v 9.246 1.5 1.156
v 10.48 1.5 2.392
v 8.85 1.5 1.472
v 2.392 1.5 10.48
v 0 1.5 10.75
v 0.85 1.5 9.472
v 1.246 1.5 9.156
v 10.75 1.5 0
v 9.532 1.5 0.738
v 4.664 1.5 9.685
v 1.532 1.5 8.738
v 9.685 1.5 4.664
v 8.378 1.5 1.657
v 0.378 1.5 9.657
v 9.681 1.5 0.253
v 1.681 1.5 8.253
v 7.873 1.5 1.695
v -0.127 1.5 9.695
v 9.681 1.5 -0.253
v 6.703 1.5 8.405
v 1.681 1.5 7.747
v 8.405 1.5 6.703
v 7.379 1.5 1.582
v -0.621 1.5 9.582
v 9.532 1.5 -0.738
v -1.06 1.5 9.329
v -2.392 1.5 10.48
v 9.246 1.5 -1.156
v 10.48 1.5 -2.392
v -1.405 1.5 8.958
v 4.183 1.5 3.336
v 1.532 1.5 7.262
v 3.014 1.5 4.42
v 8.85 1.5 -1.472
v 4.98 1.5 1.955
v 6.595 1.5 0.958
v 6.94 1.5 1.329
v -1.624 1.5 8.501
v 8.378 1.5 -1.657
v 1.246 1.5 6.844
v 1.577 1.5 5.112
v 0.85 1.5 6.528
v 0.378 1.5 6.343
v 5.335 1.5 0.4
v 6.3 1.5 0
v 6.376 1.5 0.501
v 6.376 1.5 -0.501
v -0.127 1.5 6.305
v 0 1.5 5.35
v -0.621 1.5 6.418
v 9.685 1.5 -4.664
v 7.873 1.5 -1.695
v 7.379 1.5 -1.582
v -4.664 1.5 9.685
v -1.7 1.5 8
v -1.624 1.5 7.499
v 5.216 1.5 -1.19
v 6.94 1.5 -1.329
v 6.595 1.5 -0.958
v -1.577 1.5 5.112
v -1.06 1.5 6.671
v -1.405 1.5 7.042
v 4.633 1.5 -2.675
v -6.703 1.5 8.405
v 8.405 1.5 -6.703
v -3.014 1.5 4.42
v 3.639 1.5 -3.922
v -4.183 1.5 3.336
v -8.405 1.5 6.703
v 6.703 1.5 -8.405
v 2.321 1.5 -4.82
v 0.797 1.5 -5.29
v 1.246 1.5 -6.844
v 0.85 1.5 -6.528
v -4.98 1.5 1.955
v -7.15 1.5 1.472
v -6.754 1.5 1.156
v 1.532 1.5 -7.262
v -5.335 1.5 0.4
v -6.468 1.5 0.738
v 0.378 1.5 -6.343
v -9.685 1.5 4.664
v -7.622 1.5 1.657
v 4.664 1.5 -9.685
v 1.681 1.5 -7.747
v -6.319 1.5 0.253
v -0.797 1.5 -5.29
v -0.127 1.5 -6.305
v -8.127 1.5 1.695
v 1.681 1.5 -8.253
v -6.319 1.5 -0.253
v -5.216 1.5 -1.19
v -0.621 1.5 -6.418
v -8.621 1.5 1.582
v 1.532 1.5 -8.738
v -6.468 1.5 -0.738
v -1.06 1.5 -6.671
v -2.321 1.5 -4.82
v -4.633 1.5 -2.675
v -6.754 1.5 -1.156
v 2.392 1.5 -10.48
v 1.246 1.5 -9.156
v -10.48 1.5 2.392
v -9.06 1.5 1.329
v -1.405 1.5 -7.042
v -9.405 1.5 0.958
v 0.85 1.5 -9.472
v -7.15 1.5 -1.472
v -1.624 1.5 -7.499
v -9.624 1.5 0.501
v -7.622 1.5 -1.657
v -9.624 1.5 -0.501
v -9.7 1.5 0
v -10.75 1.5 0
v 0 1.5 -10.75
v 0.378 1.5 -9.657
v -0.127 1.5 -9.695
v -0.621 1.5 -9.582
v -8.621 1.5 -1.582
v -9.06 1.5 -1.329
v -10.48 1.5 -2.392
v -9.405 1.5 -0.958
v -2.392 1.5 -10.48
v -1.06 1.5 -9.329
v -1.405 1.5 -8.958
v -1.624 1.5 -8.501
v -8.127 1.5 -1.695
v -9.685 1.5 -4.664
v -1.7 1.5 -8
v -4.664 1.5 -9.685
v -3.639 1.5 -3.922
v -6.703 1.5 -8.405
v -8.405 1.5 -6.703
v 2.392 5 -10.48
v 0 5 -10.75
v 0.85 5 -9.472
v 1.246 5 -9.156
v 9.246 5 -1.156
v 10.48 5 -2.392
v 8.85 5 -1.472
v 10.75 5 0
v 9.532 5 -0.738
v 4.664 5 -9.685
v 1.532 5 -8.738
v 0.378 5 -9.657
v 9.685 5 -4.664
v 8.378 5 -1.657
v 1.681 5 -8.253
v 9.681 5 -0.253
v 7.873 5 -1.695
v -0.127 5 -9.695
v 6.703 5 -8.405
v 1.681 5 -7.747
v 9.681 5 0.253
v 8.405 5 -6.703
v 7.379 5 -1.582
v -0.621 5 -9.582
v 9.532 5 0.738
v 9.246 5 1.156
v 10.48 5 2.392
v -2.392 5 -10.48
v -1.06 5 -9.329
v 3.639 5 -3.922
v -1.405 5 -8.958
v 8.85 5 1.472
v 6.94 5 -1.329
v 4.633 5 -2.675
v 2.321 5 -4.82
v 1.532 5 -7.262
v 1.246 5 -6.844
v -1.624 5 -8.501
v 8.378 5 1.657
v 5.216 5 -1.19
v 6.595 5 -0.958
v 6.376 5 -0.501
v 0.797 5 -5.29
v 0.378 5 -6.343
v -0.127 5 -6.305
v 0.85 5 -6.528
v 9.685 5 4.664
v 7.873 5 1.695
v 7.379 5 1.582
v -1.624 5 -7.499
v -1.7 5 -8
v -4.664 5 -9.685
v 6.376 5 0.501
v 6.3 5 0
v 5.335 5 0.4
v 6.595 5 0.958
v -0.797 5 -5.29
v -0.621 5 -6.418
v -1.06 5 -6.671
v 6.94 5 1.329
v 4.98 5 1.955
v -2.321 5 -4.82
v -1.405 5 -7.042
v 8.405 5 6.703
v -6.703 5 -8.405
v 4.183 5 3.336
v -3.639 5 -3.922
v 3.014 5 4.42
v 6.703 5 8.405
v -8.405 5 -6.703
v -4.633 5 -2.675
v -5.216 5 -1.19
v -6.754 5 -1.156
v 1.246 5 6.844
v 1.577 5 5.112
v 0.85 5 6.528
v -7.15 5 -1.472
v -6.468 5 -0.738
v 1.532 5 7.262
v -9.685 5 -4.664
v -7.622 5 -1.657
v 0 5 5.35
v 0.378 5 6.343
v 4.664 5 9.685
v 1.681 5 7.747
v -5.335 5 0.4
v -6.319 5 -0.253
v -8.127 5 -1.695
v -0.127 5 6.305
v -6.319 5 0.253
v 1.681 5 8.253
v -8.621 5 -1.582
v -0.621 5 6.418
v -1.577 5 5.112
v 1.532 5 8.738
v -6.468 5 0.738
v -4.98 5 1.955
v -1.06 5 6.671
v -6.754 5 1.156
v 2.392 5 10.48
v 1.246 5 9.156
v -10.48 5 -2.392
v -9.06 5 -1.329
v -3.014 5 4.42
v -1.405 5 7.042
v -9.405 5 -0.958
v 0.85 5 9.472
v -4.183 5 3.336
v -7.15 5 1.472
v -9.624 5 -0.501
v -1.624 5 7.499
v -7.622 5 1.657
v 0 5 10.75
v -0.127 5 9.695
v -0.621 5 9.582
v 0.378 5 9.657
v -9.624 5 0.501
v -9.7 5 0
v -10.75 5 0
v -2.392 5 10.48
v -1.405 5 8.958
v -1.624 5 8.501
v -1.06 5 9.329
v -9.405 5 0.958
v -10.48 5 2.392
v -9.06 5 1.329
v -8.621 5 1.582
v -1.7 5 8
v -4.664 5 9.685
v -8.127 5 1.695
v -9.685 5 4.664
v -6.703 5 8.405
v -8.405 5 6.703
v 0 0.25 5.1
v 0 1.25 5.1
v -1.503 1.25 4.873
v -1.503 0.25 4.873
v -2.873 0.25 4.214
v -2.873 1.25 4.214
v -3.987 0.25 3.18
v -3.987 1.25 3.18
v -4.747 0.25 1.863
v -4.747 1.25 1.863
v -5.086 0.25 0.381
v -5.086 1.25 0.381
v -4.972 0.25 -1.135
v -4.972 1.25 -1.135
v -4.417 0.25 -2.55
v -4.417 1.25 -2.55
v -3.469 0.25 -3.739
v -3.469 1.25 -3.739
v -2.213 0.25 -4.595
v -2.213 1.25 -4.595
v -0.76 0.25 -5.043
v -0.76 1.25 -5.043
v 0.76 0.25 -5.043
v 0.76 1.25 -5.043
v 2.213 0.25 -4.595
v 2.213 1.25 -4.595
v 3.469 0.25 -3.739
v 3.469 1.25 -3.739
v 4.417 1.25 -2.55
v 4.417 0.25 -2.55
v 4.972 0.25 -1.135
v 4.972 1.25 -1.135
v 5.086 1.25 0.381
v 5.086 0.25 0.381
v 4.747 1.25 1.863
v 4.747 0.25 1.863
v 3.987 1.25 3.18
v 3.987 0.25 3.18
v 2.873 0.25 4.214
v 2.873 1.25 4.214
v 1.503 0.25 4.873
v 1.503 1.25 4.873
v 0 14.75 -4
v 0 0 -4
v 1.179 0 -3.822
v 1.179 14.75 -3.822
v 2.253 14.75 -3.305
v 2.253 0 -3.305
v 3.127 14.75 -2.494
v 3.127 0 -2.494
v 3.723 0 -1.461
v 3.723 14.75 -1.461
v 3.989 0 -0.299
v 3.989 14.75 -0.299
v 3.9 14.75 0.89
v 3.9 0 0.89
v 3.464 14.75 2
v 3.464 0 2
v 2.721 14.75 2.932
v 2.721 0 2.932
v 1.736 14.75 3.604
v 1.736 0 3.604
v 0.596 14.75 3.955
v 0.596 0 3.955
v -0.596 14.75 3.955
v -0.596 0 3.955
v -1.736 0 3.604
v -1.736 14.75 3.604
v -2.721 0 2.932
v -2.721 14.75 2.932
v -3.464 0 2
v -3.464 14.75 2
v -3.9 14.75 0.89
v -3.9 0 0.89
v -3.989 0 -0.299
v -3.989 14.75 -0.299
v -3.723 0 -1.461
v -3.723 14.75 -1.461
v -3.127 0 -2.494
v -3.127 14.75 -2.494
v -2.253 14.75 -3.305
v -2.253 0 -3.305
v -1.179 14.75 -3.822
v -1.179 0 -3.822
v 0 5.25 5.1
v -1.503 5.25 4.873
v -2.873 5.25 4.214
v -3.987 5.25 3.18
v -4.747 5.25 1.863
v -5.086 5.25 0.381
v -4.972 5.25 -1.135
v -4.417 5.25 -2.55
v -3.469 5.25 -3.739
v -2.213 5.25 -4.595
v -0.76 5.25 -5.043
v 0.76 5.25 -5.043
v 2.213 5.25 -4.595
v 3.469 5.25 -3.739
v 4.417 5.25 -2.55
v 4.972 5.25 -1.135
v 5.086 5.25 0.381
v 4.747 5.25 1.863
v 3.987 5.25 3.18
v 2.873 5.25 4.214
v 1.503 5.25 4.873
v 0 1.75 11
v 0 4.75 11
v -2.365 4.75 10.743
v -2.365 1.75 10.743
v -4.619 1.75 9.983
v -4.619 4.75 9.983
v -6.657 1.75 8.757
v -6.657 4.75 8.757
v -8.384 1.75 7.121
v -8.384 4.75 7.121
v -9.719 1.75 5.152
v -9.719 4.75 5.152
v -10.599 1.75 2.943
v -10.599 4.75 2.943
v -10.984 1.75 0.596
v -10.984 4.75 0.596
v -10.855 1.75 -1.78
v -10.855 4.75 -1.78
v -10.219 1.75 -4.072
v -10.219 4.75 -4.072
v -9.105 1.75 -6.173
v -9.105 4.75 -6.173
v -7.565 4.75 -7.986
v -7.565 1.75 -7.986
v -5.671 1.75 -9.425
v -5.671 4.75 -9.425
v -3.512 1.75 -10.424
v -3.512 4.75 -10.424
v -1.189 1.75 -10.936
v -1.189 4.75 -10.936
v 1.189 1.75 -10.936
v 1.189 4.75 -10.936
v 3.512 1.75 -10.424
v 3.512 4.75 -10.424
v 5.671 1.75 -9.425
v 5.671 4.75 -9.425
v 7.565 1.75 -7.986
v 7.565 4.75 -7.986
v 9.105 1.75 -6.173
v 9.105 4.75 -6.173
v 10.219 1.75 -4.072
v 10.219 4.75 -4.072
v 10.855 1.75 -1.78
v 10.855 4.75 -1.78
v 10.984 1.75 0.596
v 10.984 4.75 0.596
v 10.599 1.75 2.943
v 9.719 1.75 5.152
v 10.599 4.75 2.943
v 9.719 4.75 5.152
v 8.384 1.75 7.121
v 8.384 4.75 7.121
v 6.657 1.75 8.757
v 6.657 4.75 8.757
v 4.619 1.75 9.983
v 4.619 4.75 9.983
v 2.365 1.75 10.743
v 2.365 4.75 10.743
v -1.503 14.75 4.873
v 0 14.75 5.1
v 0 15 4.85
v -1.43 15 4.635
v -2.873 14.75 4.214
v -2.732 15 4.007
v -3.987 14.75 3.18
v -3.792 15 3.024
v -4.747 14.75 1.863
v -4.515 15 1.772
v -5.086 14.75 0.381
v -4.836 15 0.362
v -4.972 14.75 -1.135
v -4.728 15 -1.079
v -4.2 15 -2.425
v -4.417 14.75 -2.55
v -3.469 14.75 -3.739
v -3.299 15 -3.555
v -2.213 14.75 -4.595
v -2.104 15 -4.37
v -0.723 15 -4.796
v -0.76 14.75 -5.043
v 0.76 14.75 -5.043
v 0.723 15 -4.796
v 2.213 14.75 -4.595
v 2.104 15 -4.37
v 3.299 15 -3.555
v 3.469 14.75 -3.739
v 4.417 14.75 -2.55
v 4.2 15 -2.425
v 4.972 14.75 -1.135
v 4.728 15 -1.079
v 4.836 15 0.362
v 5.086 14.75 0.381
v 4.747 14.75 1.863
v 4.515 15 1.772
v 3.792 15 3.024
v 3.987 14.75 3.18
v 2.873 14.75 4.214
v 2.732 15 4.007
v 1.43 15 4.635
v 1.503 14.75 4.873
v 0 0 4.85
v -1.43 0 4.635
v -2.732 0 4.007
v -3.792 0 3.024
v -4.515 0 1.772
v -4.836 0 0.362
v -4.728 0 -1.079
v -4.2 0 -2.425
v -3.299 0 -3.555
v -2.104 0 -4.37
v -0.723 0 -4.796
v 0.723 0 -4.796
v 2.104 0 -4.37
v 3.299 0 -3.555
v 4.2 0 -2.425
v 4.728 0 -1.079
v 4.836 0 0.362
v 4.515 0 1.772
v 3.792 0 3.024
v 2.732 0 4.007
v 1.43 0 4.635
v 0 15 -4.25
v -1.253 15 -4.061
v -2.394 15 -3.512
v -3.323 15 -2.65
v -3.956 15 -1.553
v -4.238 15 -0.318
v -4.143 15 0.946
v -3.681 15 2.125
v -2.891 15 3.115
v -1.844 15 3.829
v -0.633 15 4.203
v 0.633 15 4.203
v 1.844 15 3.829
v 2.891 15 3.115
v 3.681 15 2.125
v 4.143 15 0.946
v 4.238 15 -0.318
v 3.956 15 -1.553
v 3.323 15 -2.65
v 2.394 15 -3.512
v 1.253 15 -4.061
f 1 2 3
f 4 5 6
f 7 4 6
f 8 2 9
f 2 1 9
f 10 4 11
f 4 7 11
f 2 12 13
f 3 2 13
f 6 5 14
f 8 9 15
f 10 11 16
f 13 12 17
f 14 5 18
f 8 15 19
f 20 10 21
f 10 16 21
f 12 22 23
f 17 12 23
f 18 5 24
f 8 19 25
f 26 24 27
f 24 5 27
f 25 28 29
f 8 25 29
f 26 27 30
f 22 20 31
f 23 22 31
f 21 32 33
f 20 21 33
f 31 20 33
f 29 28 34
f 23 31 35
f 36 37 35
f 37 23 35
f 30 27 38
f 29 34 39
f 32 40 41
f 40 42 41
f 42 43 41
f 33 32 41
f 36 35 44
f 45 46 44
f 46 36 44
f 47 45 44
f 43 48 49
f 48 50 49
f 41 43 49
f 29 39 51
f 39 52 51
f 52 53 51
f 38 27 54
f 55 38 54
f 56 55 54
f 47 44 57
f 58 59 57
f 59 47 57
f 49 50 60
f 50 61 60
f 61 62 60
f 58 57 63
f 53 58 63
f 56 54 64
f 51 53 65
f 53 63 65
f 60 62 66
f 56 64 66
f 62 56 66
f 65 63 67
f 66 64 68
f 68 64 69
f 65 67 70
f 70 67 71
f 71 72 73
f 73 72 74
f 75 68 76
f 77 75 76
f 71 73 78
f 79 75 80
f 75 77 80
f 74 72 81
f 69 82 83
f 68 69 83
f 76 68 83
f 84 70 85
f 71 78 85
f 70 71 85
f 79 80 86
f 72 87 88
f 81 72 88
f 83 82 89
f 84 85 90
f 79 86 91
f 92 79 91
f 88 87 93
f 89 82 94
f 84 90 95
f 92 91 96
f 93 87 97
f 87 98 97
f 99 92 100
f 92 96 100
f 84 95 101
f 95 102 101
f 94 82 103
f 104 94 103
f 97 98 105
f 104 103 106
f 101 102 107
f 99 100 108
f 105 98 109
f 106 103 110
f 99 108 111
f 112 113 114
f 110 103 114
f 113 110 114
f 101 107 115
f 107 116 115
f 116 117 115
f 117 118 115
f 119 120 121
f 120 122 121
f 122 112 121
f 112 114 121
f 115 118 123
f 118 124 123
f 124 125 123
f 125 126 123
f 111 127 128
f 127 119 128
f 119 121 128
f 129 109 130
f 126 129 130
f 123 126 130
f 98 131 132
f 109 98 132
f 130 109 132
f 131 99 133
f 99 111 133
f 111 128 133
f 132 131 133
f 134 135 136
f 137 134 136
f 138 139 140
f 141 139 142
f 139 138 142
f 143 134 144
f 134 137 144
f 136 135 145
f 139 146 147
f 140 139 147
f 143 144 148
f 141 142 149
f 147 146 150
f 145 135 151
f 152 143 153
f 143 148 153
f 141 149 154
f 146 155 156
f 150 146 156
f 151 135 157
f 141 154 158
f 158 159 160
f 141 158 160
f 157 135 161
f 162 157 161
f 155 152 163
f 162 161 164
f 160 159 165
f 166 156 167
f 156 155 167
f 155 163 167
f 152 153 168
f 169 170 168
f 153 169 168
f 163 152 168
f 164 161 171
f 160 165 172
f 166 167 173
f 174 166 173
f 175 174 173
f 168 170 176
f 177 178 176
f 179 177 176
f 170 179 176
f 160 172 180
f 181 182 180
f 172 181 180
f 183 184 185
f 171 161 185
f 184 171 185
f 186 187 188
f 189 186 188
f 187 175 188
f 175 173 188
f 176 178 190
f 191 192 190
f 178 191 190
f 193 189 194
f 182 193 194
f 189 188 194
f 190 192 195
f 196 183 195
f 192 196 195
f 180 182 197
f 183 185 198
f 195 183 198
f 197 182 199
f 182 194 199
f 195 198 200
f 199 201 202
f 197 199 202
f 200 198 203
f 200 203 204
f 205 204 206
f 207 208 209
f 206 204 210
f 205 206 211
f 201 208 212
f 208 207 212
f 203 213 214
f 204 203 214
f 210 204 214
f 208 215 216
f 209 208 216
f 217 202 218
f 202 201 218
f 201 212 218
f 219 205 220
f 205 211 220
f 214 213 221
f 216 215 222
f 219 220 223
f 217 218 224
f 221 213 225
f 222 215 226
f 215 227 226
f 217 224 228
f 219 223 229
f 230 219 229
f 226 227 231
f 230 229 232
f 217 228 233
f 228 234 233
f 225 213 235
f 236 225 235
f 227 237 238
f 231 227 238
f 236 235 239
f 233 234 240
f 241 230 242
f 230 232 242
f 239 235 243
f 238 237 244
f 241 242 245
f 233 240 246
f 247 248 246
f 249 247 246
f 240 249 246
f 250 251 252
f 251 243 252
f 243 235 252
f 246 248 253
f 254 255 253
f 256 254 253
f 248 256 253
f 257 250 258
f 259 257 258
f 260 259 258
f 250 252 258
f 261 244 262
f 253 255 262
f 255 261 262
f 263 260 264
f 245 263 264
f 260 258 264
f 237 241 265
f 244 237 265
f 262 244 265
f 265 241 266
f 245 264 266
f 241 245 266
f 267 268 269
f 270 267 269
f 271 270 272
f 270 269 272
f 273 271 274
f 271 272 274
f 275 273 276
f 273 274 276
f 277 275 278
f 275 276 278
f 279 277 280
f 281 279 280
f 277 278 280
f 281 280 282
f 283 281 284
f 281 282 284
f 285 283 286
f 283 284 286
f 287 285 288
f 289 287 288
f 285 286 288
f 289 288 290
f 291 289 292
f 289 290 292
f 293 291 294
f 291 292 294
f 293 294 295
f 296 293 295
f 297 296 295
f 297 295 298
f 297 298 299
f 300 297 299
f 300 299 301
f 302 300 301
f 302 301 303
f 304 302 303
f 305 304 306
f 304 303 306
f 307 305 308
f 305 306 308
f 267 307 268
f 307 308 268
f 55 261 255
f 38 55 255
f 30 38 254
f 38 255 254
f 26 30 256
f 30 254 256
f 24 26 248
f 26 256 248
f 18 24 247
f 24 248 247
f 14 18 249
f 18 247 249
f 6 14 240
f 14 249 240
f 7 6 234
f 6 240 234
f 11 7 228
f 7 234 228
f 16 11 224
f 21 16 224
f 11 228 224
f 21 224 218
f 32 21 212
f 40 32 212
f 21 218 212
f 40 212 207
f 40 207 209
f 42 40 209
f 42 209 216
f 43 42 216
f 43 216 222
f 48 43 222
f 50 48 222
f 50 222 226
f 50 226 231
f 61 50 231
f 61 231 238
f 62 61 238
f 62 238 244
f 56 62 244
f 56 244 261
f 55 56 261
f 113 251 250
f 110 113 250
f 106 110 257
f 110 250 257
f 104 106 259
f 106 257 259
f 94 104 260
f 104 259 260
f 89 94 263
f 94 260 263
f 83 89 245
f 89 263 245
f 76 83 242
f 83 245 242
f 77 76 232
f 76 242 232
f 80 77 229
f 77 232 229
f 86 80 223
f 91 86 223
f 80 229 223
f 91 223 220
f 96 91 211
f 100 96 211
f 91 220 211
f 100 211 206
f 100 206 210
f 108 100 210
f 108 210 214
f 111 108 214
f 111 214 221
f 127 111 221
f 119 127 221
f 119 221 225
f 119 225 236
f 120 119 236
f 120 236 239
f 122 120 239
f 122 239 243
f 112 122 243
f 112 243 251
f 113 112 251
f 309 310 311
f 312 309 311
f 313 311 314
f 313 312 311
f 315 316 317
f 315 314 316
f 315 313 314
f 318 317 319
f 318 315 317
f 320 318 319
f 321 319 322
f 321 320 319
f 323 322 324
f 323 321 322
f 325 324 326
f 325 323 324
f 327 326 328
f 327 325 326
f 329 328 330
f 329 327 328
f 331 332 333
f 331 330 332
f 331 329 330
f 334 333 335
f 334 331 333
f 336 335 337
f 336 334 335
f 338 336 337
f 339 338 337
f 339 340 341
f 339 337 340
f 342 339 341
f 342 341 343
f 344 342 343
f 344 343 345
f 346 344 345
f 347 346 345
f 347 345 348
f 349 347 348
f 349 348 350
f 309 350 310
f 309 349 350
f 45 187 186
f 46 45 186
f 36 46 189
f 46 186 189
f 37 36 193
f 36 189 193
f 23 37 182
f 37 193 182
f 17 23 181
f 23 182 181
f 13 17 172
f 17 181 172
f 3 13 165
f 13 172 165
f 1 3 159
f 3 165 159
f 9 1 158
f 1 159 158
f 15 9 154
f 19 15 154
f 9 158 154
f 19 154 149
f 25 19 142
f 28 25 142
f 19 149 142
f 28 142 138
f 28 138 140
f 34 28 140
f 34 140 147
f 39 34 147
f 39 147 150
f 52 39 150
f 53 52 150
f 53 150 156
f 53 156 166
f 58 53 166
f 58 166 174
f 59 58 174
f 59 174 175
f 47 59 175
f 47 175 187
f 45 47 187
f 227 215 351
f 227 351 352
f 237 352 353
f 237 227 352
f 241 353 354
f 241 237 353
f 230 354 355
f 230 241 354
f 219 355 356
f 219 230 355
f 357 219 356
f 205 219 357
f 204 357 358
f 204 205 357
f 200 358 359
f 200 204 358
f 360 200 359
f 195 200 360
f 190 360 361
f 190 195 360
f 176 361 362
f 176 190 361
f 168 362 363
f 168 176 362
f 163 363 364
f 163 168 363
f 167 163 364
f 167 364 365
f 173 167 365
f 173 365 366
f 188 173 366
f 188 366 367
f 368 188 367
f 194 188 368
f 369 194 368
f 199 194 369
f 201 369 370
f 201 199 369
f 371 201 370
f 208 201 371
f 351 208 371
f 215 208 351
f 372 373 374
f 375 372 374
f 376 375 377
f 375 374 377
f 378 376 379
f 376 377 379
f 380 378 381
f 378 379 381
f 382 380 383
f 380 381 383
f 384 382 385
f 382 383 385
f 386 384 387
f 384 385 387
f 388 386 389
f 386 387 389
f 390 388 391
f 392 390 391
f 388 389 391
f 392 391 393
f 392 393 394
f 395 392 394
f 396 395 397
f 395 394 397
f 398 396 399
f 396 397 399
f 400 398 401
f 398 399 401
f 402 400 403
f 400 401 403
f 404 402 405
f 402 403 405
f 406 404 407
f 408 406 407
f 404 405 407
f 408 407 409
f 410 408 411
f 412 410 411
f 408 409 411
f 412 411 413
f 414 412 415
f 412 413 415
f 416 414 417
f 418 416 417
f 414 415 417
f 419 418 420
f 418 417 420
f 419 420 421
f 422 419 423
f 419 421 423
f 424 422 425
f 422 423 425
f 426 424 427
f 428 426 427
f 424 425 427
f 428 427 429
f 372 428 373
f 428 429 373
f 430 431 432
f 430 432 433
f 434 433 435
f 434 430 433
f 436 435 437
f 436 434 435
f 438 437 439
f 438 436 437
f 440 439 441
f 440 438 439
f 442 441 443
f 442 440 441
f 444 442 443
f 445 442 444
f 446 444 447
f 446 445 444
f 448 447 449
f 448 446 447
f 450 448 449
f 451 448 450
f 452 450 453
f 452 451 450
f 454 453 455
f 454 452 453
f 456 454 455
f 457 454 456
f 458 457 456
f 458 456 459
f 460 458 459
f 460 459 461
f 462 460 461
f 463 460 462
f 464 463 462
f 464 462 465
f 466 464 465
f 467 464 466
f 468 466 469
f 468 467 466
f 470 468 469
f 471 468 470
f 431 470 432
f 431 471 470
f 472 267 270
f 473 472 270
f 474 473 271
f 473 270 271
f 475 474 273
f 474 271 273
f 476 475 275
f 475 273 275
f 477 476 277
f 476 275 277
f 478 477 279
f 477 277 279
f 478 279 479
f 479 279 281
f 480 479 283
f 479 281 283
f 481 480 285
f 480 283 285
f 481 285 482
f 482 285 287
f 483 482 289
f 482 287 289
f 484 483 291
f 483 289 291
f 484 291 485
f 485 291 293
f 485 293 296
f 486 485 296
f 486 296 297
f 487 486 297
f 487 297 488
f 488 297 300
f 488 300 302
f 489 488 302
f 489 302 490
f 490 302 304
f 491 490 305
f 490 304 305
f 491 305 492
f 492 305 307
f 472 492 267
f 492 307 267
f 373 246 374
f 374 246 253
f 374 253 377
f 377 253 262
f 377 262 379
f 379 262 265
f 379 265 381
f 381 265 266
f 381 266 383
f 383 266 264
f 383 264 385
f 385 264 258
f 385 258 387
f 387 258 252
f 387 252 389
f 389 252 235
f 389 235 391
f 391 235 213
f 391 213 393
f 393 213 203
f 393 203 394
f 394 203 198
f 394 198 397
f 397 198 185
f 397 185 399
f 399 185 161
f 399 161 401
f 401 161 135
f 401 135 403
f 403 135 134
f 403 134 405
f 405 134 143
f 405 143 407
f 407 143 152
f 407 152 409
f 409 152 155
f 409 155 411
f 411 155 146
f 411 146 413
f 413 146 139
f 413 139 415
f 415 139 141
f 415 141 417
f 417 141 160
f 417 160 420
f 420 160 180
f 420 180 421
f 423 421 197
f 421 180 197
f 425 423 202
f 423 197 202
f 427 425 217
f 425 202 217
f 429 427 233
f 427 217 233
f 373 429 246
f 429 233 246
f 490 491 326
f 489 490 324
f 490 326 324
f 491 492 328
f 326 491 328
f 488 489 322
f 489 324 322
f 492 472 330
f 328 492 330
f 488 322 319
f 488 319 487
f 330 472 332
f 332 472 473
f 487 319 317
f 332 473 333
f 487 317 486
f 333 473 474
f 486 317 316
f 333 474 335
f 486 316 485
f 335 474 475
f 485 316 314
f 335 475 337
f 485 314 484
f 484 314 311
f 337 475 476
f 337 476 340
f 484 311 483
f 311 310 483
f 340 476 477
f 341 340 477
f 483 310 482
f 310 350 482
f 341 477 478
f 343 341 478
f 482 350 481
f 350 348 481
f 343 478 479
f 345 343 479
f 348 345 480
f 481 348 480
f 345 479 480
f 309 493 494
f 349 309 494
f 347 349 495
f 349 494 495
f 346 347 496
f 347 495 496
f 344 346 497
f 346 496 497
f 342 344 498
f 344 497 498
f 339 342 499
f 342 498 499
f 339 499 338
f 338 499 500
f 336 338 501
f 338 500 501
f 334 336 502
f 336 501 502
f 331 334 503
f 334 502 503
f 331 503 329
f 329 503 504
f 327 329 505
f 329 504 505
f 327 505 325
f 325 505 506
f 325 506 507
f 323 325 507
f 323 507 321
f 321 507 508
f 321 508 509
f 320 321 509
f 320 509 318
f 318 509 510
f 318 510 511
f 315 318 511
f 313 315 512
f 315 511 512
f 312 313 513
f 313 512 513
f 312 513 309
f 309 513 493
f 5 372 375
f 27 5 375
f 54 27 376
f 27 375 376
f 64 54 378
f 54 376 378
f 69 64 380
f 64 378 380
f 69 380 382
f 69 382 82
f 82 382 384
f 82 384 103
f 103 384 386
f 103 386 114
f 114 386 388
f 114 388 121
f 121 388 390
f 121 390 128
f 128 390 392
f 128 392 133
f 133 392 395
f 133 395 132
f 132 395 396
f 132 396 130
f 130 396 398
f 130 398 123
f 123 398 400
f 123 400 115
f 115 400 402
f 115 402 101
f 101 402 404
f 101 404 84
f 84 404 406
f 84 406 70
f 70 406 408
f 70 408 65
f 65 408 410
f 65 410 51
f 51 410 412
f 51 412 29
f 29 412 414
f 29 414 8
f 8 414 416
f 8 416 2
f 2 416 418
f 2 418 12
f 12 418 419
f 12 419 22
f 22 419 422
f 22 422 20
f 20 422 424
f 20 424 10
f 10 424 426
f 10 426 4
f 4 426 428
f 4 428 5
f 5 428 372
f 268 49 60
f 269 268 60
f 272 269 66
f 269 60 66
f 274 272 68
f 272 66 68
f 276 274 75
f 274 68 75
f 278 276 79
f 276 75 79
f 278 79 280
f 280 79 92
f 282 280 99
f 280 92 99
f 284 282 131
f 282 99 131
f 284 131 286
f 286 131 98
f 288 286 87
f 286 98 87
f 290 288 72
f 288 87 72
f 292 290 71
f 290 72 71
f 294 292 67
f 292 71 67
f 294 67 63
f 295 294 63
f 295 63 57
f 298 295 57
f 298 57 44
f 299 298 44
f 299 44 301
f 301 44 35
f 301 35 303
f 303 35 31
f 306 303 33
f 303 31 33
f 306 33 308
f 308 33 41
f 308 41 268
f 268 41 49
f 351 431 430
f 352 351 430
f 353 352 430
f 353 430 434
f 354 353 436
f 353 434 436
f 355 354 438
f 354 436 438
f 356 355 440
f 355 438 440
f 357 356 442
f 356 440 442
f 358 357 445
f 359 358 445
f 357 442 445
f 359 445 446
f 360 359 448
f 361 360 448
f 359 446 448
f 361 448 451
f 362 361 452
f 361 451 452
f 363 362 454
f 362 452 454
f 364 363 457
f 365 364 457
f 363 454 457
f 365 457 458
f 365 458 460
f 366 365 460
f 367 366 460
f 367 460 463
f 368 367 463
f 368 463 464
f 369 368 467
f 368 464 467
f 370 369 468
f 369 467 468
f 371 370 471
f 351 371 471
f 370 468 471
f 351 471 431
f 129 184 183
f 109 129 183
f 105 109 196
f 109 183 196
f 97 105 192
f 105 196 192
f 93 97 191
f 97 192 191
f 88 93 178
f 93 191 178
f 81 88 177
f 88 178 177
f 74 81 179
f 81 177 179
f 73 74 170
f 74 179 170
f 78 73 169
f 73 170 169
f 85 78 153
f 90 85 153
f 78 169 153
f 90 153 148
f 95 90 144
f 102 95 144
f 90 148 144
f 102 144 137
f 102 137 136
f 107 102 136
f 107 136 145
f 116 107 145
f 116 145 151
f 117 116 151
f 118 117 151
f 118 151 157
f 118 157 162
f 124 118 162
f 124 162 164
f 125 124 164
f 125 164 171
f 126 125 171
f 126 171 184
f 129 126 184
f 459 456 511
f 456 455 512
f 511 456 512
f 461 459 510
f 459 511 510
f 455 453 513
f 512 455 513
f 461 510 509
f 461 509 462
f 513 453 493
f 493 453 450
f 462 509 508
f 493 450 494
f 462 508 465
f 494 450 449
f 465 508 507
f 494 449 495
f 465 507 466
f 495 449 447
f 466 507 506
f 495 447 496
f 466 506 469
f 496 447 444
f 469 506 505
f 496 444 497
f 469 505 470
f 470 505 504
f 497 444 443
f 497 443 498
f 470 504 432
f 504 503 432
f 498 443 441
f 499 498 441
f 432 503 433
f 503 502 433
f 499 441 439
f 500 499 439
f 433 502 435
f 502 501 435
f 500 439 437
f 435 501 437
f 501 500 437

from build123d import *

# Parameters (mm, degrees)
CUT_EXTRUDE1_DEPTH       = 22.610182785
CUT_EXTRUDE1_DEPTH_BACK  = 22.610182785
SKETCH2_R                = 4
M3_CLEARANCE_HOLE1_D     = 3.4
M3_CLEARANCE_HOLE1_DEPTH = 10
M3_CLEARANCE_HOLE1_TIP   = 1.021463052
CHAMFER1_SIZE            = 0.25


with BuildPart() as part:
    # Sketch1 → Revolve1 (revolve)
    with BuildSketch(Plane.XY, mode=Mode.PRIVATE) as revolve1_sk:
        Polygon((0, 0), (5.1, 0), (5.1, 1.5), (11, 1.5), (11, 5), (5.1, 5), (5.1, 15), (0, 15), align=None)
    revolve(revolve1_sk.sketch.rotate(Axis((0, 0, 0), (0, -1, 0)), 90), axis=Axis((0, 0, 0), (0, -1, 0)))

    # Sketch2 → Cut-Extrude1 (cut, two sides: drawn at the far end of the back side and taken through both)
    with BuildSketch(Plane.XZ.offset(-CUT_EXTRUDE1_DEPTH_BACK)):
        with Locations(Location((0, 0, 0), (0, 0, 270))):
            Circle(SKETCH2_R)
    extrude(amount=CUT_EXTRUDE1_DEPTH + CUT_EXTRUDE1_DEPTH_BACK, mode=Mode.SUBTRACT)

    # M3 Clearance Hole1
    with Locations(Plane.XZ.offset(-1.5)):
        with Locations((0, 8), (8, 0), (0, -8), (-8, 0), (0, 0)):
            Hole(M3_CLEARANCE_HOLE1_D / 2, depth=M3_CLEARANCE_HOLE1_DEPTH)
            with Locations((0, 0, -(M3_CLEARANCE_HOLE1_DEPTH + M3_CLEARANCE_HOLE1_TIP / 2))):  # 118° drill point
                Cone(0, M3_CLEARANCE_HOLE1_D / 2, M3_CLEARANCE_HOLE1_TIP, mode=Mode.SUBTRACT)

    # Chamfer1
    chamfer1_edges = [part.edges().sort_by_distance(p)[0] for p in [
        (0, 15, 4),
        (0, 15, -5.1),
        (0, 5, -5.1),
        (0, 5, -11),
        (0, 1.5, -11),
        (0, 1.5, -5.1),
        (0, 0, -5.1),
    ]]
    chamfer(chamfer1_edges, length=CHAMFER1_SIZE)


solid = part.part
